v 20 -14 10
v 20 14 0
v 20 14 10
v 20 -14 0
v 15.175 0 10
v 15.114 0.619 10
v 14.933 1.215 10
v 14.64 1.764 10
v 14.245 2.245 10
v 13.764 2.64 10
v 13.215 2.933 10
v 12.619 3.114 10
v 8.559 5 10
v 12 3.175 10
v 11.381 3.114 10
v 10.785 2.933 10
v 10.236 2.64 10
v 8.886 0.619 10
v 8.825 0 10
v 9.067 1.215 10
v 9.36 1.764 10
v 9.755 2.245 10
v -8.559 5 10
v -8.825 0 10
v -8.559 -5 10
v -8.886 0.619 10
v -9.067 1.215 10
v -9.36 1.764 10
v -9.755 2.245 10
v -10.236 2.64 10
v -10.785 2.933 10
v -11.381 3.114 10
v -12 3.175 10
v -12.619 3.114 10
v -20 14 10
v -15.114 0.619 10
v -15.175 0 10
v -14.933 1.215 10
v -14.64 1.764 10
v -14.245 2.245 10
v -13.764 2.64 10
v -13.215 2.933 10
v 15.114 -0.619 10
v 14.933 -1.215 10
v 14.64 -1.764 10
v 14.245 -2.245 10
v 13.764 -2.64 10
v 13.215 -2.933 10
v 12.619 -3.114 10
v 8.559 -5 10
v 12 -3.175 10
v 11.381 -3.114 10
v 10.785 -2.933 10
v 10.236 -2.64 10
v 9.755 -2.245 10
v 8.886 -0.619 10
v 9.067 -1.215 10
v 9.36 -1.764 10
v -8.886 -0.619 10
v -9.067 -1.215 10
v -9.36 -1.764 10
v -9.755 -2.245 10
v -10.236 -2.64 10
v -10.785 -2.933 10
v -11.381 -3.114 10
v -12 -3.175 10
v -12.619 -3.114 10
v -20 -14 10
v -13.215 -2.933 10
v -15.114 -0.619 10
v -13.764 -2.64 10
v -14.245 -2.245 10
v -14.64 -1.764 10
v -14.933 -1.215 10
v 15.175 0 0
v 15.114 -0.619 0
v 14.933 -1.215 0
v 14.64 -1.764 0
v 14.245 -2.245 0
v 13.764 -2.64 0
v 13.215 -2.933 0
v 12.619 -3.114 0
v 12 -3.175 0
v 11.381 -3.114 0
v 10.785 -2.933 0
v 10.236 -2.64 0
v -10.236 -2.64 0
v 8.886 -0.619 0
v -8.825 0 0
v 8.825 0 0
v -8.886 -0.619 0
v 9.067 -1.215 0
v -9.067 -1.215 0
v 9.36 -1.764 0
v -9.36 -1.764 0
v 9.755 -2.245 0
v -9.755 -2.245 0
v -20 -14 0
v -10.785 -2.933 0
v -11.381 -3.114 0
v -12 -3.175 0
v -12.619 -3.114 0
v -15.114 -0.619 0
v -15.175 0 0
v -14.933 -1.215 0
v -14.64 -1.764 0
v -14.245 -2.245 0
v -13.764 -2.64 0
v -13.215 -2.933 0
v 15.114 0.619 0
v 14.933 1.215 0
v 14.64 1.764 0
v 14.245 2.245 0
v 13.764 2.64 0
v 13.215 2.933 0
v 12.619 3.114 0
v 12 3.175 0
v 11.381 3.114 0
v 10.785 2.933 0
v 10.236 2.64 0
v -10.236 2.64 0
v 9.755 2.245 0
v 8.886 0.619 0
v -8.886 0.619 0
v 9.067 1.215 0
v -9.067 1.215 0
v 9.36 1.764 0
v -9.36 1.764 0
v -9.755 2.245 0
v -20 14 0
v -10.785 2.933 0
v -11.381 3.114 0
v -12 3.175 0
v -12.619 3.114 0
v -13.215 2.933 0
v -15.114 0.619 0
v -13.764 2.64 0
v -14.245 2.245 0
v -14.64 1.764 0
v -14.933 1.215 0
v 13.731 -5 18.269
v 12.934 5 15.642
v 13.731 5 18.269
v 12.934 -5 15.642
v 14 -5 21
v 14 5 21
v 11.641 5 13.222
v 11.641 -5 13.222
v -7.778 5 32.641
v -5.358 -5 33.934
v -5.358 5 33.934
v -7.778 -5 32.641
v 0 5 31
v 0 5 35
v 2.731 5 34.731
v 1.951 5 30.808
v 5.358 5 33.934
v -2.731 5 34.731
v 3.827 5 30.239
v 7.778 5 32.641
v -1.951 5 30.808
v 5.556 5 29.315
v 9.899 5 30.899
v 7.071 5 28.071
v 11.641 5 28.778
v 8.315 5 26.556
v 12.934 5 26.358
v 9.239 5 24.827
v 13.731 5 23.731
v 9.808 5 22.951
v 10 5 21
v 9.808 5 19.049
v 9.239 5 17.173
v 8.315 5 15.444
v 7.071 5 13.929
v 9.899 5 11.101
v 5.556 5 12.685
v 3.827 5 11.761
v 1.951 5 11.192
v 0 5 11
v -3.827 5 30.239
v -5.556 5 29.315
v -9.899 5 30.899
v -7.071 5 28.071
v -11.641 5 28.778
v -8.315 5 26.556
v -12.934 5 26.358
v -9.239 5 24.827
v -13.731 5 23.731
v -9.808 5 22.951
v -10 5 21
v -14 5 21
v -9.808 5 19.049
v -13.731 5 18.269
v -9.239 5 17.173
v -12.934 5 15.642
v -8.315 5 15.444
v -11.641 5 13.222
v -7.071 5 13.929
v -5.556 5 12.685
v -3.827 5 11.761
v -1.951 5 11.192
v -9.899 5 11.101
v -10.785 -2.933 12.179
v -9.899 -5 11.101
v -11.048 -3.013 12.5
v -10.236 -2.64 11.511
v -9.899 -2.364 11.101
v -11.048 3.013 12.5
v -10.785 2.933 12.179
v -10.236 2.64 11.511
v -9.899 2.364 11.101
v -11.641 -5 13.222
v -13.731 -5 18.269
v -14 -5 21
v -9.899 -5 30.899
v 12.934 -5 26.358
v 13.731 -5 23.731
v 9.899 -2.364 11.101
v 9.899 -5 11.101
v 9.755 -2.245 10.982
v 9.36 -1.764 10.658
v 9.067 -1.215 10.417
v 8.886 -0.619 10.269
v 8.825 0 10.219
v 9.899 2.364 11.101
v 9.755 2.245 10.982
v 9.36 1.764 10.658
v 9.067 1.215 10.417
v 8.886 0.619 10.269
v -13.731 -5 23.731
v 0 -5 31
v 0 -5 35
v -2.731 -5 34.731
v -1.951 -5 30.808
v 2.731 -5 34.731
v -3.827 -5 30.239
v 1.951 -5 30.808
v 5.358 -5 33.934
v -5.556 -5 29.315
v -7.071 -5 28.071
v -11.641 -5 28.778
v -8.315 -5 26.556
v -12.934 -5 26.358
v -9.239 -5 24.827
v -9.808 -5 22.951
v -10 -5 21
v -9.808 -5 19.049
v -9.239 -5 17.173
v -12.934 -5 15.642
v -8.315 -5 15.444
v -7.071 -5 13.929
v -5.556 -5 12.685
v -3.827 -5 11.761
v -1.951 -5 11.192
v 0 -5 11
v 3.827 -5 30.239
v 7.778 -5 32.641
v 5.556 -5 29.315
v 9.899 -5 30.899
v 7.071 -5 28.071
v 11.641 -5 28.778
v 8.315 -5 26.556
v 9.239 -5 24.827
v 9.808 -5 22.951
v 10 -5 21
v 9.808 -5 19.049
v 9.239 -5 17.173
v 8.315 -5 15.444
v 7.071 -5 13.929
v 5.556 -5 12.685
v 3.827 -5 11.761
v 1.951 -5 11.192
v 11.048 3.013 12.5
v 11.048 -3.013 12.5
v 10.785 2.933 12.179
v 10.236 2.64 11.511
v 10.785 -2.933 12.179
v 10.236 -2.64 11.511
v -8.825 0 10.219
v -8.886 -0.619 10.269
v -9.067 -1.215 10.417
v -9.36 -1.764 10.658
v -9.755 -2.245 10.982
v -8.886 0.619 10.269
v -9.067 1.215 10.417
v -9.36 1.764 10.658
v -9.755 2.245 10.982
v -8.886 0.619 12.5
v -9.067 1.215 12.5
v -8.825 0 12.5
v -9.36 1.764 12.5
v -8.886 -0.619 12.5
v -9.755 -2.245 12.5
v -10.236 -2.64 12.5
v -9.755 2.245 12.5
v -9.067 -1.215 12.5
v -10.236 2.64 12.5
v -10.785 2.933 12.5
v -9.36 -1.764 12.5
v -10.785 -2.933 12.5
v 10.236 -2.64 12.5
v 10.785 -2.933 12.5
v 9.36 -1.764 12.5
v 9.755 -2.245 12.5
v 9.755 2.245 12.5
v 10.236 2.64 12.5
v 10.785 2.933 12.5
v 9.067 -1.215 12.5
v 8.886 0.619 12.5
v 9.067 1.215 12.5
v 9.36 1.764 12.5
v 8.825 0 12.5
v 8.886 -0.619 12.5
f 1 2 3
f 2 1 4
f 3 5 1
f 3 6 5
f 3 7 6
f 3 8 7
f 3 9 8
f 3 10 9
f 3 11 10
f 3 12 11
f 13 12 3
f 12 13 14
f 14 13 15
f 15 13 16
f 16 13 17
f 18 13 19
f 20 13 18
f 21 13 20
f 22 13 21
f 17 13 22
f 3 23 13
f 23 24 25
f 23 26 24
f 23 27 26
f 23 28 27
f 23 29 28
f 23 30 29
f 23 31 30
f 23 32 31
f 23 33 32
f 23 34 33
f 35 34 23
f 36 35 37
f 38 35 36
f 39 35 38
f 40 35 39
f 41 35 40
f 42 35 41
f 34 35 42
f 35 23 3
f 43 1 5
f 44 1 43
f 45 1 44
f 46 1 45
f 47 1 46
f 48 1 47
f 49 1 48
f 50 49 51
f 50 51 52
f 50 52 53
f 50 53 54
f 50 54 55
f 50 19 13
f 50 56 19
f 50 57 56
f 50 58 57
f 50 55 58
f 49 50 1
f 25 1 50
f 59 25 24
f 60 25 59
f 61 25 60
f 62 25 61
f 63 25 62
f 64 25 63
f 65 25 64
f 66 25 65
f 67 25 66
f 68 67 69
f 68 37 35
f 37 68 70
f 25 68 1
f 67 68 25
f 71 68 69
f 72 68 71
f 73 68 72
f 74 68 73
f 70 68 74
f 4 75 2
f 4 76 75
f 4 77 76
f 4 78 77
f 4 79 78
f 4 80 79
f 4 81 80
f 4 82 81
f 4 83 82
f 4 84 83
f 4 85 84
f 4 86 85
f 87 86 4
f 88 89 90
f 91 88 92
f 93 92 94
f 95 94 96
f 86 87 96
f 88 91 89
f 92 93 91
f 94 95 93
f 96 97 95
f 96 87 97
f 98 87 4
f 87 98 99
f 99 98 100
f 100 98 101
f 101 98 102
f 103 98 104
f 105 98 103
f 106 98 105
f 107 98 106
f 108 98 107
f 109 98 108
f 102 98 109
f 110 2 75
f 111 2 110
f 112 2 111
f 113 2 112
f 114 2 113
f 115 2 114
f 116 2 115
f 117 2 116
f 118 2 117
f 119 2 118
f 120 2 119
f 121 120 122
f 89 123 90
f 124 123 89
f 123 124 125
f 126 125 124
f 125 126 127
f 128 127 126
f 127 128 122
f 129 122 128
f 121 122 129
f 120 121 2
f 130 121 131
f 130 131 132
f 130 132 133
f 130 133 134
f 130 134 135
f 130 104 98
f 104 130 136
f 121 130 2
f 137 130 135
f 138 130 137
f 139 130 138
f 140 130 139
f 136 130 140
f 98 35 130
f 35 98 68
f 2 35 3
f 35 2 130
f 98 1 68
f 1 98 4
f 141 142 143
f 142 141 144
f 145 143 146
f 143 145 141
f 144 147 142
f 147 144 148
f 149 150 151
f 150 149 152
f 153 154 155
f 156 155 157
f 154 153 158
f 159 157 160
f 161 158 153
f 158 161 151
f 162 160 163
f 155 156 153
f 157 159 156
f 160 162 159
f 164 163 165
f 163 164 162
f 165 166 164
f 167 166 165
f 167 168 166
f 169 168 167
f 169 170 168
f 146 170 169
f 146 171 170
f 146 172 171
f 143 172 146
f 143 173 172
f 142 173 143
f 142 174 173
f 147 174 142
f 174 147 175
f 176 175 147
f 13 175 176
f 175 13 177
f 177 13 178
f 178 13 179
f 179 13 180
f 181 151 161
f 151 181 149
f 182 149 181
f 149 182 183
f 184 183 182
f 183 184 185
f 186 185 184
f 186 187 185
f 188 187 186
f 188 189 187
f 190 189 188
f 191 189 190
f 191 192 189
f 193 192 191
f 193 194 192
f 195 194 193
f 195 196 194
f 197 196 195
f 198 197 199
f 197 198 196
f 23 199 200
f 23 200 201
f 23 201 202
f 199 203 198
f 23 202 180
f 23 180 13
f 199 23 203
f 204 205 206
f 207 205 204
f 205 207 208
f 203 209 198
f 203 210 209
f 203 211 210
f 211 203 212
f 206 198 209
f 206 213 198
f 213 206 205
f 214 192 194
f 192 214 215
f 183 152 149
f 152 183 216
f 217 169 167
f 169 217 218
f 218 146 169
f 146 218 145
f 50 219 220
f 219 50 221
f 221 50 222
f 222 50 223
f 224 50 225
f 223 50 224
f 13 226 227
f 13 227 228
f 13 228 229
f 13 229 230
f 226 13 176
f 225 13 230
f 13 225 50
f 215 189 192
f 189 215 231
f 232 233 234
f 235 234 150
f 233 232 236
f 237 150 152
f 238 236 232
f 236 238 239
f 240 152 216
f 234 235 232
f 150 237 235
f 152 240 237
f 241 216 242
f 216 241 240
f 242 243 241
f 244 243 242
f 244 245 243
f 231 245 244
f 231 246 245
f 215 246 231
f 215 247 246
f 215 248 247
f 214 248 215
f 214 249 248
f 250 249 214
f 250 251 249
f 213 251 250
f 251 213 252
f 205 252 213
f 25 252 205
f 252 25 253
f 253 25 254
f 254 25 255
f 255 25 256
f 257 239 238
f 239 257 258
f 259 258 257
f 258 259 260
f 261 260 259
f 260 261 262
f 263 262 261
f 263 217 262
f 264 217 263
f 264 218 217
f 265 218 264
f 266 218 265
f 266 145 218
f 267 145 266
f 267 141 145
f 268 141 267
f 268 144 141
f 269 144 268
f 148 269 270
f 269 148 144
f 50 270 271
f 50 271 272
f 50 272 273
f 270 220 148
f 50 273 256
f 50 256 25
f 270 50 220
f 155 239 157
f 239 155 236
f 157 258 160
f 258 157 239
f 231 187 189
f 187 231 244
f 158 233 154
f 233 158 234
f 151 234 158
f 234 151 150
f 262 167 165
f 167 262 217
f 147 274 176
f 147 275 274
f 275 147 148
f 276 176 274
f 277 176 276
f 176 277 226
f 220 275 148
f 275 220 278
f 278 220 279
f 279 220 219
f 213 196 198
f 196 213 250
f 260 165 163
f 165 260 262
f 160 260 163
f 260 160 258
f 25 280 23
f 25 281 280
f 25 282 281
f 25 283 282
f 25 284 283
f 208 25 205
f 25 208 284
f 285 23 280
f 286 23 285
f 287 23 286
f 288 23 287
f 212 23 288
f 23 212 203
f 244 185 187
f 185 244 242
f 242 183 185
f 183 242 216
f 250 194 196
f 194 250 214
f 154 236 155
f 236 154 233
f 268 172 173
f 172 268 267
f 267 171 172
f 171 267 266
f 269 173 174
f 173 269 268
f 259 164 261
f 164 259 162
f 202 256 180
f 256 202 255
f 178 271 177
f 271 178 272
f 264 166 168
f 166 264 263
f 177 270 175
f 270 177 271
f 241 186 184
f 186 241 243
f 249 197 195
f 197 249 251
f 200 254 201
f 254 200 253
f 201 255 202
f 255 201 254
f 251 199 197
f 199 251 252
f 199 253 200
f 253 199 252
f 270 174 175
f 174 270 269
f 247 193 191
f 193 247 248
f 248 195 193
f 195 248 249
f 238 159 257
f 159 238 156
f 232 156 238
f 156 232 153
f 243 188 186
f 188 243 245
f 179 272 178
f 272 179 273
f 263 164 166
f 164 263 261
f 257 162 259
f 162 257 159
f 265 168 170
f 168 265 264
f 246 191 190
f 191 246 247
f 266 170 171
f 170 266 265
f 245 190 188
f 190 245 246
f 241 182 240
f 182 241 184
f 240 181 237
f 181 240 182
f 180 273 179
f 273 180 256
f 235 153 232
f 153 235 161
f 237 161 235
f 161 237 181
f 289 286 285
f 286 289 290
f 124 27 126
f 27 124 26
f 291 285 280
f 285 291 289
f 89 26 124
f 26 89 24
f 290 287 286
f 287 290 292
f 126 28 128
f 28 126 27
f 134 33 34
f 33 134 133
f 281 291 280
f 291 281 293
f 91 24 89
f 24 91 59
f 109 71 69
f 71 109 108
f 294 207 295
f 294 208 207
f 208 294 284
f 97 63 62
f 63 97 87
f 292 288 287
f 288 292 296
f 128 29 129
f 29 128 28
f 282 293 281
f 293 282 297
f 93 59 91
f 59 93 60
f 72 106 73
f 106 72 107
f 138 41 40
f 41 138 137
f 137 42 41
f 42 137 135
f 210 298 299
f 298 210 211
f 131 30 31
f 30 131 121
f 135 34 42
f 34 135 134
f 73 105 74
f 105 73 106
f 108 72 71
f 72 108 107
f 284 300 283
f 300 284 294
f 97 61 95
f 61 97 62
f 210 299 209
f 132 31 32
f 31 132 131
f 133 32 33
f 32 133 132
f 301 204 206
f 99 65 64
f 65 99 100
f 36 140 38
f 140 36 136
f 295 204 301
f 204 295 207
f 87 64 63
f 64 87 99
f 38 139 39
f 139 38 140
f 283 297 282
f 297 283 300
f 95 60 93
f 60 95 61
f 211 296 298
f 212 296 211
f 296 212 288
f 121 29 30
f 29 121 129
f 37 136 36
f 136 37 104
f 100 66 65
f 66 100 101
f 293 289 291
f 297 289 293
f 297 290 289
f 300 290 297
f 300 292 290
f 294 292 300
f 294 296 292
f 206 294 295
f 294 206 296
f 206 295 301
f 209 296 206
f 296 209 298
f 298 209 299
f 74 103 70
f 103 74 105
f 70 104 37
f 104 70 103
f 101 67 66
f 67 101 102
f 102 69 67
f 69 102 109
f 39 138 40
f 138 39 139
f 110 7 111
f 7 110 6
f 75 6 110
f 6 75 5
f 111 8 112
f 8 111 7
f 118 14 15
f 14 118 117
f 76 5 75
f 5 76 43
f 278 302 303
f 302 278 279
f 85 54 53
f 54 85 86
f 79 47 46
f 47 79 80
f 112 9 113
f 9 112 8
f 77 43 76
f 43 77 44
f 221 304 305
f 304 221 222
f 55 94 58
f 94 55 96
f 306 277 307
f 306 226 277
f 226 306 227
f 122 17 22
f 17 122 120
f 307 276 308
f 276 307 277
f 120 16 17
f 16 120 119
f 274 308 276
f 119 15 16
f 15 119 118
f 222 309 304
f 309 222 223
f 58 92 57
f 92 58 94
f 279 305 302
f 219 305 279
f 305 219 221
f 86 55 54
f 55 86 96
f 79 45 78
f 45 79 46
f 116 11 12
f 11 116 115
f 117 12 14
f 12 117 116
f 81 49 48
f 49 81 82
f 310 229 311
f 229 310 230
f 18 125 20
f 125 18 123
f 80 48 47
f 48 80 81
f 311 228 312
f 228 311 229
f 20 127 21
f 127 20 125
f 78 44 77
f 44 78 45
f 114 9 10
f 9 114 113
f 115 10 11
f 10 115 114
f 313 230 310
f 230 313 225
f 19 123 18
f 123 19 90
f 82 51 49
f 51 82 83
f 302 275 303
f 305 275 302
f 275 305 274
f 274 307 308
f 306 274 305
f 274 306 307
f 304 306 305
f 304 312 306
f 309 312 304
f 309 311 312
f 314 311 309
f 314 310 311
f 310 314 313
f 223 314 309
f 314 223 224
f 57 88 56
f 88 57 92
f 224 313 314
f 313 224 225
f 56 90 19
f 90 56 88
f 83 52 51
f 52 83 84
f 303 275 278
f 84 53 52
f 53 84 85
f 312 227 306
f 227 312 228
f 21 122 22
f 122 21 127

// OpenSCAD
$fn = 32;

// ----------------------------------------------------------------------
// Deck eye: 28 mm eye on a 40 mm base
// ----------------------------------------------------------------------

// --- parameters (mm) ---
base_l = 40;              // base length
base_w = 28;              // base width
base_t = 10;              // base thickness
eye_r = 14;               // eye outside radius
eye_bore = 20;            // eye bore diameter
eye_w = 10;               // eye thickness
eye_z = 21;               // eye centre height
holes_d = 6.35;           // fixing holes
hole_x = 12;              // fixing hole spacing

difference() {
  union() {
    translate([-20, -14, 0]) cube([base_l, base_w, base_t]);
    /* eye standing upright, its foot sunk 3 mm into the base */
    translate([0, -5, 21]) rotate([-90, 0, 0]) cylinder(h = 10, d = 28);
  }
  /* eye bore, 2.5 mm clear of both faces */
  translate([0, -7.5, 21]) rotate([-90, 0, 0]) cylinder(h = 15, d = 20);
  translate([-12, 0, -2.5]) cylinder(h = base_t + 5, d = holes_d);
  translate([12, 0, -2.5]) cylinder(h = base_t + 5, d = holes_d);
}
